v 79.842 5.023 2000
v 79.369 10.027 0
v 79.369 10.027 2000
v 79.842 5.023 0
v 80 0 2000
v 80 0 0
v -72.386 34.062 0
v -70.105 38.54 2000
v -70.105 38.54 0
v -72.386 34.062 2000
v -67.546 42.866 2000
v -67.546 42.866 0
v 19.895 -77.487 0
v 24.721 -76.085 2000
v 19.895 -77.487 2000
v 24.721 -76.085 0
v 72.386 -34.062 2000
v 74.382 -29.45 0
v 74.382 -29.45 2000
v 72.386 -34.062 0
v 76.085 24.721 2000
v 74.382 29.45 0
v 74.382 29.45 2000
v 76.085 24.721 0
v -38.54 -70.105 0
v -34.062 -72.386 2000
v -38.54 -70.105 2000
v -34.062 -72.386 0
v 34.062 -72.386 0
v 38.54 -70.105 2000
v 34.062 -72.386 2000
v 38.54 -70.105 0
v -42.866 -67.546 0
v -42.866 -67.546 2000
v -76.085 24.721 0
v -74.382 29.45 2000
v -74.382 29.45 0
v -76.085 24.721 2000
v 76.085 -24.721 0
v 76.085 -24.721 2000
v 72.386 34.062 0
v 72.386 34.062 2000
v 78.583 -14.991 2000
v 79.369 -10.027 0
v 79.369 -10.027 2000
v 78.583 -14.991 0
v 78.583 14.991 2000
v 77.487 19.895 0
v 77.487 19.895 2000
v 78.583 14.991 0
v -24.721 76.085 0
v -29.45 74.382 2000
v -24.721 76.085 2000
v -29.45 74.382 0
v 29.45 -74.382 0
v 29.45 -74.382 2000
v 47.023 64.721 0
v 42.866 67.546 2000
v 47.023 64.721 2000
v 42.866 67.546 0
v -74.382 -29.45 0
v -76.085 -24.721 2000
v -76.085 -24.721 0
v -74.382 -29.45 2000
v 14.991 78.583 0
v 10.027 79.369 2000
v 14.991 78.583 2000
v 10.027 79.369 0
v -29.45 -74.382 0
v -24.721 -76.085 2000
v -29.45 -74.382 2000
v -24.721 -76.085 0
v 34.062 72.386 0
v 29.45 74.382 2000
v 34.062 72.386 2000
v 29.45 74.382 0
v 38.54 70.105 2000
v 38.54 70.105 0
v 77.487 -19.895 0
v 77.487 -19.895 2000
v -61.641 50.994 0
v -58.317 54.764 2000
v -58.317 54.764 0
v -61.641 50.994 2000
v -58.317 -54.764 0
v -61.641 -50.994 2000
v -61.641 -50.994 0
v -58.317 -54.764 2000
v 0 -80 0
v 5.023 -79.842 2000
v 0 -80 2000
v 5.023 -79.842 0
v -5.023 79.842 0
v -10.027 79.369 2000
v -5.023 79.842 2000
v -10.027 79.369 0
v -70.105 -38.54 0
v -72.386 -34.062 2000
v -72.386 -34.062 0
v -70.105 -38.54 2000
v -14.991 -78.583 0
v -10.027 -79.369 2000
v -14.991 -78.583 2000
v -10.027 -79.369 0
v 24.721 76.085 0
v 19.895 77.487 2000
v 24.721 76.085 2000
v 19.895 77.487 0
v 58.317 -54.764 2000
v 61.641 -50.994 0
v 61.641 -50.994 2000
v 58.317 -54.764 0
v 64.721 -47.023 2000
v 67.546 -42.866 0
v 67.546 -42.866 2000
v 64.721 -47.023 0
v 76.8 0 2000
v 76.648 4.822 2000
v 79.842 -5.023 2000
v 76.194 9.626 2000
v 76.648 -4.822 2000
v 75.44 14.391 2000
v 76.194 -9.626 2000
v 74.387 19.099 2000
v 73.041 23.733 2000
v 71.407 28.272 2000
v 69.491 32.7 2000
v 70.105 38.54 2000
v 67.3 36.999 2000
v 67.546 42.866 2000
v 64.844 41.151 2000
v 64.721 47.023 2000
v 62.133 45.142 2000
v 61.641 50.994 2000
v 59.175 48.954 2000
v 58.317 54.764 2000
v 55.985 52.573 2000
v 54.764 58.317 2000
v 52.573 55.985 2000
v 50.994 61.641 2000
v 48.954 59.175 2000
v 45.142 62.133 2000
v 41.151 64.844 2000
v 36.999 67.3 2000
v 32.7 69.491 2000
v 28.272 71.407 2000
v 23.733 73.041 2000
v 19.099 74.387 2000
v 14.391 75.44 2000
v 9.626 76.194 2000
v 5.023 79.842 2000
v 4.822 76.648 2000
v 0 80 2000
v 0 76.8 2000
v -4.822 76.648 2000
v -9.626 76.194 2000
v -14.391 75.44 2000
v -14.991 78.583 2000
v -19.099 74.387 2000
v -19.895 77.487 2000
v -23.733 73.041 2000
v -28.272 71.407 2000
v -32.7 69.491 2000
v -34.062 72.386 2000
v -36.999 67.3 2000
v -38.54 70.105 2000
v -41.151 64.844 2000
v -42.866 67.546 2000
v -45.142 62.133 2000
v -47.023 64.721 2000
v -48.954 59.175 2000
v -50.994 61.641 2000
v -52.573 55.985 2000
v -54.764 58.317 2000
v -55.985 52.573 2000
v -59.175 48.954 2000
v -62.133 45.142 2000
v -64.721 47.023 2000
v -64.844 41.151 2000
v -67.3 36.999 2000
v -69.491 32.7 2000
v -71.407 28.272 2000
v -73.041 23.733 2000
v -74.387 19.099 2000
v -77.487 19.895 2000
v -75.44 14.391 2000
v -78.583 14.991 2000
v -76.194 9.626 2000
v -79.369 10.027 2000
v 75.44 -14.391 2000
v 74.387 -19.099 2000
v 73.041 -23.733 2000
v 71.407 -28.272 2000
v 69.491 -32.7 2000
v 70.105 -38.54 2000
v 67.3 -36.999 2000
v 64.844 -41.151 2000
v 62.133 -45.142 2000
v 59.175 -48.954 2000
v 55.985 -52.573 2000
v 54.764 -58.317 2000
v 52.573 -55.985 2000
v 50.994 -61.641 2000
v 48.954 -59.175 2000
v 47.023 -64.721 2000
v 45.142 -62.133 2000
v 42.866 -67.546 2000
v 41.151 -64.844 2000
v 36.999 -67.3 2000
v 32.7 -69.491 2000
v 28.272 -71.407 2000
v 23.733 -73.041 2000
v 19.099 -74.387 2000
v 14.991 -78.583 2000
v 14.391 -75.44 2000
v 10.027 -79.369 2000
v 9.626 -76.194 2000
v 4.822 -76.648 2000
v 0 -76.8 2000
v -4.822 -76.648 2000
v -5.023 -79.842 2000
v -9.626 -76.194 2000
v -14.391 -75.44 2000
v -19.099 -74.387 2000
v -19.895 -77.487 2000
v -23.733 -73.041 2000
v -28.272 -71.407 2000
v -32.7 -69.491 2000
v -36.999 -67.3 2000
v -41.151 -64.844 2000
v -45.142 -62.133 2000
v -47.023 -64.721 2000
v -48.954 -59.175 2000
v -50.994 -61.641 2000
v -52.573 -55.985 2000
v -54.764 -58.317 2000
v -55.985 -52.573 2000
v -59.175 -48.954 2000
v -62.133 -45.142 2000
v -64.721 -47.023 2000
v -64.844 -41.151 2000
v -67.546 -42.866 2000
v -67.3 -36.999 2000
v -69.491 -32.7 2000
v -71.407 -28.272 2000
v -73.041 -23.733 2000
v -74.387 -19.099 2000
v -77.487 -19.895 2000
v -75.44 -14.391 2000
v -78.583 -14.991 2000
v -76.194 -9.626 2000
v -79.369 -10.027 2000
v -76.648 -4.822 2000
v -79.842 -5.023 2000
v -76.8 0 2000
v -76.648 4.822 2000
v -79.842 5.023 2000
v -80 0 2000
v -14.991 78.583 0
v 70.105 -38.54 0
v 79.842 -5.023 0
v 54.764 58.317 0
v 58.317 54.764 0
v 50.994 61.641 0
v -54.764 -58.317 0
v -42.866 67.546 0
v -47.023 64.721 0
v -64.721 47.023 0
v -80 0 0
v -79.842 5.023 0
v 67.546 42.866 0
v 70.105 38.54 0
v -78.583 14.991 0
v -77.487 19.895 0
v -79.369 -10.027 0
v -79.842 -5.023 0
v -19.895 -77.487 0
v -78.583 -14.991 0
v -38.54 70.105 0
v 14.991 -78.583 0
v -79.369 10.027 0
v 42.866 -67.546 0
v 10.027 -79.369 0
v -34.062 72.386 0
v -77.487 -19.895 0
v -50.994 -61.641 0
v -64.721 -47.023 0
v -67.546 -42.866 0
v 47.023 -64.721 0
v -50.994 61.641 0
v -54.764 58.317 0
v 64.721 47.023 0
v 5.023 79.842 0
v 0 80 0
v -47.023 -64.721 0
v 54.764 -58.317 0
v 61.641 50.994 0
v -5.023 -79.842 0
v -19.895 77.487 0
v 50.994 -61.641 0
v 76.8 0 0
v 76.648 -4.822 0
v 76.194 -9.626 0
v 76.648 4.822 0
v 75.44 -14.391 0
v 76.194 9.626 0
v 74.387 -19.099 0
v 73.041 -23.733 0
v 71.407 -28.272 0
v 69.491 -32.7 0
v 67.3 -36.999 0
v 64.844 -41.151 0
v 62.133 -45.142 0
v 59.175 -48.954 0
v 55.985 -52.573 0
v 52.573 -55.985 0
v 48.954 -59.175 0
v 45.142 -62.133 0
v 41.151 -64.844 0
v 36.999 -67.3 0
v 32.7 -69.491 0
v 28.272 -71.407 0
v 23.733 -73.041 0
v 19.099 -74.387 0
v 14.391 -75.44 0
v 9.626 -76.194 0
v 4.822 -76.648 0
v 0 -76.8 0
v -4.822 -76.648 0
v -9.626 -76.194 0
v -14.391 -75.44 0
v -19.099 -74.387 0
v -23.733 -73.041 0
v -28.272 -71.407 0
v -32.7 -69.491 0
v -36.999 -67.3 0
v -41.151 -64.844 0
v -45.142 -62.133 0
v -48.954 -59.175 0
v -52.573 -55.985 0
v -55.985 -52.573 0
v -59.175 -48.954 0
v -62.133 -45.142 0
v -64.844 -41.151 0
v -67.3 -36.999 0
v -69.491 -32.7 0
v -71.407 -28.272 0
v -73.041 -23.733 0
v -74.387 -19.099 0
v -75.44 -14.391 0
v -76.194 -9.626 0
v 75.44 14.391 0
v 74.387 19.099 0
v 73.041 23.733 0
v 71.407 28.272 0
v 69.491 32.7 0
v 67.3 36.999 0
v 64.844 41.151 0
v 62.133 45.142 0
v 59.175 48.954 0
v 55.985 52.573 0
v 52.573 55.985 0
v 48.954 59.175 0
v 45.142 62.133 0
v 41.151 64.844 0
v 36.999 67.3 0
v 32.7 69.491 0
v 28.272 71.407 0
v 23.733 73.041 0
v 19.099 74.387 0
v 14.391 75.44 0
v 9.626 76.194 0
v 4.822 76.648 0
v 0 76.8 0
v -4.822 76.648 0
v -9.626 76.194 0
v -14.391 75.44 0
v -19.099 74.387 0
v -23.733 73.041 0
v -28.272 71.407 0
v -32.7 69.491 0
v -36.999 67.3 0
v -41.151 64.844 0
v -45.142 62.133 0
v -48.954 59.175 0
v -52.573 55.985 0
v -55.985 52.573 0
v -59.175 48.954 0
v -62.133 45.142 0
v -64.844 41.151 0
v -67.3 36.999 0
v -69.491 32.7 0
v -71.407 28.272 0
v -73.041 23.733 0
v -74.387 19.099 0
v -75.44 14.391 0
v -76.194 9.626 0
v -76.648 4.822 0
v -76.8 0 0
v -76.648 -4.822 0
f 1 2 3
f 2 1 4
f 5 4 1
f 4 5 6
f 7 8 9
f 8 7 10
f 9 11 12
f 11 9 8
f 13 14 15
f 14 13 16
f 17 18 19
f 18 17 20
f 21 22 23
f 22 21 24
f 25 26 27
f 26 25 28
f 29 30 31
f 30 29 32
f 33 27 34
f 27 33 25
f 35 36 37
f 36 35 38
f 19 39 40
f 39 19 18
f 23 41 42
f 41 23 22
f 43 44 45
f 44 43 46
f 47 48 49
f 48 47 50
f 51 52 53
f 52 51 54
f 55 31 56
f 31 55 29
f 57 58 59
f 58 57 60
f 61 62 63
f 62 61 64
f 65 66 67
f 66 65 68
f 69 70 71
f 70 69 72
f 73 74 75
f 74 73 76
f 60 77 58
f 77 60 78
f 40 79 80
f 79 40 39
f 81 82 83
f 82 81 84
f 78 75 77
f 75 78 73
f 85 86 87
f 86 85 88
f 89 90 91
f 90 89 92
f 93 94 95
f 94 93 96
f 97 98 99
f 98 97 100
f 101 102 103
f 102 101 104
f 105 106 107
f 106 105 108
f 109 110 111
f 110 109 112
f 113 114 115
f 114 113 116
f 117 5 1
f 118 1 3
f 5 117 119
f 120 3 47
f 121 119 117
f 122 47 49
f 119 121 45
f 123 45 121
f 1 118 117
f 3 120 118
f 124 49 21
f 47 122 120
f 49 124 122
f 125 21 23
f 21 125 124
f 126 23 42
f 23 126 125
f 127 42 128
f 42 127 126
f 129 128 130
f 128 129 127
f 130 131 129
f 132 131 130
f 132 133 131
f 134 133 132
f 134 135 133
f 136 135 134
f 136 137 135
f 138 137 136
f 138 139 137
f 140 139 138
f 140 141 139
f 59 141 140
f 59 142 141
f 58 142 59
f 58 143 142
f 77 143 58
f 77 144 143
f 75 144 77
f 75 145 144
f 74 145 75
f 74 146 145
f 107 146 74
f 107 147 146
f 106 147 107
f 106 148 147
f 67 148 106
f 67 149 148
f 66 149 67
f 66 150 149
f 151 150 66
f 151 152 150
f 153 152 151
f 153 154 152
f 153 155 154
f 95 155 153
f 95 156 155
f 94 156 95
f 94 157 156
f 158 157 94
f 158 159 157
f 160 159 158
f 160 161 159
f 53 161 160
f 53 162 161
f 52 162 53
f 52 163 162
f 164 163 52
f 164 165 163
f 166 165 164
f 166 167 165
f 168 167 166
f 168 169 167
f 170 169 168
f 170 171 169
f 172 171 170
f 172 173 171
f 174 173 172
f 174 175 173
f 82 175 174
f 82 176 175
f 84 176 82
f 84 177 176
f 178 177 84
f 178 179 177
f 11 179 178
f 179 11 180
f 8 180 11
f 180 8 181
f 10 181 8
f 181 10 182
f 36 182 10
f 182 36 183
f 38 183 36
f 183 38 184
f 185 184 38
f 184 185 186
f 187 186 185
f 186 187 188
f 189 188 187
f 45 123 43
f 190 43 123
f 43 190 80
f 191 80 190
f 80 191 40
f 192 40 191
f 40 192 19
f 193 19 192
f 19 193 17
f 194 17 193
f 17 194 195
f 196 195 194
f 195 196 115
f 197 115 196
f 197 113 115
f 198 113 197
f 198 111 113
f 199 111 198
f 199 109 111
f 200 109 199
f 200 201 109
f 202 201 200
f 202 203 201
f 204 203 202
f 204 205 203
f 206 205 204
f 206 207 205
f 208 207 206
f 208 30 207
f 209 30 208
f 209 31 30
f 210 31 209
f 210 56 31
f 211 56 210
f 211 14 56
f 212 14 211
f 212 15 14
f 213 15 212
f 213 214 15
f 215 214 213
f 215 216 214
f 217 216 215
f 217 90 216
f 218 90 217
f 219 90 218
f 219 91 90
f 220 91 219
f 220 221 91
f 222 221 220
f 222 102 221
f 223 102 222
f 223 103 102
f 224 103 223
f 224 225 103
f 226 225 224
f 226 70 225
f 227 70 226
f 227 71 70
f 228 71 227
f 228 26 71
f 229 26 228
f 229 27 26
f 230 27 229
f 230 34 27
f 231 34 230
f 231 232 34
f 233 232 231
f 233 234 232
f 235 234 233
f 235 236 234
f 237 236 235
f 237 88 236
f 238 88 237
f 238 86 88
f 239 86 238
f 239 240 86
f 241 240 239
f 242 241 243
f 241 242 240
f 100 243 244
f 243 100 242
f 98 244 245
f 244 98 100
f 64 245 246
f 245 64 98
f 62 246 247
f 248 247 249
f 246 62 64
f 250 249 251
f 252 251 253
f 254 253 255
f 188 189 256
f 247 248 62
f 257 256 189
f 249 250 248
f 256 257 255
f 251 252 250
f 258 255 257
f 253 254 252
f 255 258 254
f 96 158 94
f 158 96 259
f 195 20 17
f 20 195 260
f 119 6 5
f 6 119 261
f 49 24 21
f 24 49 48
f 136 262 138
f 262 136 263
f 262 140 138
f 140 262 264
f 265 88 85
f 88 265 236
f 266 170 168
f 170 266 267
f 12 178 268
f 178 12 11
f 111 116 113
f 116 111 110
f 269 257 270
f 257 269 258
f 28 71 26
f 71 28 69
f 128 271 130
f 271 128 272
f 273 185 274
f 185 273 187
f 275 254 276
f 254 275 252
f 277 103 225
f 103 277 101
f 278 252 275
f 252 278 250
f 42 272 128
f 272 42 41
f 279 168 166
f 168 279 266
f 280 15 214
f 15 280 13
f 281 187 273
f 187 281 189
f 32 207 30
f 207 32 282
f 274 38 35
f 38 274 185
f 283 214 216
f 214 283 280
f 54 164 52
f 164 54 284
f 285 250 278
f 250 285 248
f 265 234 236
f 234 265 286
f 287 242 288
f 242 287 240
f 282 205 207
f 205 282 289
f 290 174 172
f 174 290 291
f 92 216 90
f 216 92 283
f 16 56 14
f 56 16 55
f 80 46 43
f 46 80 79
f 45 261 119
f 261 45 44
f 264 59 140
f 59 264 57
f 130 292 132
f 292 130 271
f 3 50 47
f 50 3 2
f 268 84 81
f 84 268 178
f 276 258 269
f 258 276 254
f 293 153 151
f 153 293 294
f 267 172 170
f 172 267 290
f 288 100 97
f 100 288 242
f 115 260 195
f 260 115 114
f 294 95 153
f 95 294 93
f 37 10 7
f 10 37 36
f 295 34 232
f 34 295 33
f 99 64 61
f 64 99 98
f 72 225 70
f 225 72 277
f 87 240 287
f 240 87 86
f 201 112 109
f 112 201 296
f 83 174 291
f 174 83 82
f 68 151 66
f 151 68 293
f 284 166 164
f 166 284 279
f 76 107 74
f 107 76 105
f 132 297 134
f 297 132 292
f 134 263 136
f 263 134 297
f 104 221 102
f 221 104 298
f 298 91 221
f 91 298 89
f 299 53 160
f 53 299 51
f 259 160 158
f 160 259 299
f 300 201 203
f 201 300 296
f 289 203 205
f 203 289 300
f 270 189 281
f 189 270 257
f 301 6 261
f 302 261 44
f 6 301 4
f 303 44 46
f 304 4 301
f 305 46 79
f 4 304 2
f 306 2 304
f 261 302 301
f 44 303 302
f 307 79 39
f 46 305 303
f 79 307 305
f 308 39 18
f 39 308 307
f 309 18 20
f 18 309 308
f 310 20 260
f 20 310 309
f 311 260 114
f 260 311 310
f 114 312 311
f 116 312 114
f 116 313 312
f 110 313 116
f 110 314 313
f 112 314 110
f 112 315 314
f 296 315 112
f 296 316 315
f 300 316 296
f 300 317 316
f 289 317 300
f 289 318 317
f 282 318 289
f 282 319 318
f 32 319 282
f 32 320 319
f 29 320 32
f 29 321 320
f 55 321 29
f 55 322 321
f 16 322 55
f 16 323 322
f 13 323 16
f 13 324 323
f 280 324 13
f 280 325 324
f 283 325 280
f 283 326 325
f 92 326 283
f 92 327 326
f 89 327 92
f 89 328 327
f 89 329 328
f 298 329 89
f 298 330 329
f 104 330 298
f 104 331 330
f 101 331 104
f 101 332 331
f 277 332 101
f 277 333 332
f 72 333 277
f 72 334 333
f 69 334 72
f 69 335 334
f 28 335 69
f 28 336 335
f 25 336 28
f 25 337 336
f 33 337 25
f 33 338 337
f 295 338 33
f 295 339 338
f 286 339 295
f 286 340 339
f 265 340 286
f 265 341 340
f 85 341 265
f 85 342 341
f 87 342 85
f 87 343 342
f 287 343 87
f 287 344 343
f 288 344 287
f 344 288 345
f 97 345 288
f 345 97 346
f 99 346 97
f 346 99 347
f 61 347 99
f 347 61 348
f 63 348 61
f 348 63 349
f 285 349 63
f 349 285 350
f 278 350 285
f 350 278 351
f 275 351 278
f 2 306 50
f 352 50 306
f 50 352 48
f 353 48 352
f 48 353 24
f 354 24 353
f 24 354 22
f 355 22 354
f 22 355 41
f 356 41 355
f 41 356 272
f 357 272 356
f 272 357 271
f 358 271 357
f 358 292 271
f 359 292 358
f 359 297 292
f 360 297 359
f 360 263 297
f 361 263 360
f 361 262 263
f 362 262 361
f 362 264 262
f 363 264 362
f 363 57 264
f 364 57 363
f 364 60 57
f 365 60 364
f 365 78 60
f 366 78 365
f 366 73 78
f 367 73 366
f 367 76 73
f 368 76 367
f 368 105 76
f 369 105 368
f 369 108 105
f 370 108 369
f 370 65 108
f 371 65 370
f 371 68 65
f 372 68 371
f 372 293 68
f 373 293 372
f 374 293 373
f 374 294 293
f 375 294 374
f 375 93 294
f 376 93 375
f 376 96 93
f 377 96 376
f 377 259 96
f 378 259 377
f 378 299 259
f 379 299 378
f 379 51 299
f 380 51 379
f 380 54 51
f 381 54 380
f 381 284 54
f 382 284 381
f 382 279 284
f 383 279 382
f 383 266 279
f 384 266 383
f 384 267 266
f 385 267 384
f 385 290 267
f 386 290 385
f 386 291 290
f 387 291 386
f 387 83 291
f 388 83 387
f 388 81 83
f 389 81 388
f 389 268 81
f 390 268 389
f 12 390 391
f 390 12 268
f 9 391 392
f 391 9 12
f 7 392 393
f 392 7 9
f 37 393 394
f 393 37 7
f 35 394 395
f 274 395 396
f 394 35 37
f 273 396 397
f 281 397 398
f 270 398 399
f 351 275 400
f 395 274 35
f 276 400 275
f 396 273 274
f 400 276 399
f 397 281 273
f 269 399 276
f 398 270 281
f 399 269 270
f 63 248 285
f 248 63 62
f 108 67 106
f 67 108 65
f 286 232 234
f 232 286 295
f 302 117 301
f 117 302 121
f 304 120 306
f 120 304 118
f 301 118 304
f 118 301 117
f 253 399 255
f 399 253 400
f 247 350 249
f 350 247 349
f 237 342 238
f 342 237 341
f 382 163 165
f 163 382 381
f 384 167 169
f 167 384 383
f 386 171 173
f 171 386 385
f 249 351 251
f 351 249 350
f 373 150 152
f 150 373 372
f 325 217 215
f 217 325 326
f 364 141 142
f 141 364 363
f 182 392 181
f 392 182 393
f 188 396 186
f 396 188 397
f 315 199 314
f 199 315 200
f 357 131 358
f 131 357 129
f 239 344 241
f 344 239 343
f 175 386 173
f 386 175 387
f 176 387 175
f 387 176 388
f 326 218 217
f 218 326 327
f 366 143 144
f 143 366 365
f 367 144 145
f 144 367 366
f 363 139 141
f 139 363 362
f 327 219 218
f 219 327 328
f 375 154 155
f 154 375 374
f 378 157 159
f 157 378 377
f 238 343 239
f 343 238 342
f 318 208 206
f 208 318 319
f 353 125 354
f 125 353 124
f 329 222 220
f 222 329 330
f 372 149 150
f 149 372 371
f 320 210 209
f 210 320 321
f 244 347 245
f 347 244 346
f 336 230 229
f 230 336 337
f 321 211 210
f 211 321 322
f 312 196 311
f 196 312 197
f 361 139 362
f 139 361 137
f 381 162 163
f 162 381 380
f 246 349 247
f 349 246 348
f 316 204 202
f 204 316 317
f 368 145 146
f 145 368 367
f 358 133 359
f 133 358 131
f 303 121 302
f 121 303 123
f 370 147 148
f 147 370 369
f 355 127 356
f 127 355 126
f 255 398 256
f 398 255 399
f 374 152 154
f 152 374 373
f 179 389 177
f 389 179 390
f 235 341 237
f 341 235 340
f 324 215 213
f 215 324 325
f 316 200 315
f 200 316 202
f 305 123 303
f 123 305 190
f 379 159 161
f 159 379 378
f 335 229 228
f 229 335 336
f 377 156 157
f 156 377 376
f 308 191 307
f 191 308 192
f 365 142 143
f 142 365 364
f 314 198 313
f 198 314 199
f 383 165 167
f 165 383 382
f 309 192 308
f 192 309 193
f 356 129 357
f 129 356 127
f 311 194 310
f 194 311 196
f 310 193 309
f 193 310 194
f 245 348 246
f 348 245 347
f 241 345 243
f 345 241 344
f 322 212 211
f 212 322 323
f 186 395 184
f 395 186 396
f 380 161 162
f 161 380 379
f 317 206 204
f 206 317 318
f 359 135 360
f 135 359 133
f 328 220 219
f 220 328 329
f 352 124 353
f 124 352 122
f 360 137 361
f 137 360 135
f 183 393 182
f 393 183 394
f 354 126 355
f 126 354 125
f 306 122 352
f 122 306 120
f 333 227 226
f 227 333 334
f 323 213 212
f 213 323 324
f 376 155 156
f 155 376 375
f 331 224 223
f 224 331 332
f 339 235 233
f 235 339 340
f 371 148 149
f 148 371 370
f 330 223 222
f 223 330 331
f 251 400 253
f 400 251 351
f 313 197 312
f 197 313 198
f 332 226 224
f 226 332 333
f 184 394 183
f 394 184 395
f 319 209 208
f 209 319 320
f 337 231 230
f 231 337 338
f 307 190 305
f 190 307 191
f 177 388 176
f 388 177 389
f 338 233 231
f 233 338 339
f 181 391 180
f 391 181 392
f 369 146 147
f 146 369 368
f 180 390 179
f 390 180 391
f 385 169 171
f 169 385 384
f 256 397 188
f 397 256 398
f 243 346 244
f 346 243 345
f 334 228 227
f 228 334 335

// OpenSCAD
// HT 160 PVC Pipe Segment with a length of 2000 mm

// Parameters
pipe_diameter = 160; // Outer diameter in mm
pipe_thickness = 3.2; // Wall thickness in mm
pipe_length = 2000; // Length of the pipe in mm
fitting_length = 50; // Length of the integrated end fitting in mm

// Function to create the main pipe body
module ht_pipe_body() {
    difference() {
        cylinder(h = pipe_length, d = pipe_diameter, $fn=100);
        translate([0, 0, -1])
            cylinder(h = pipe_length + 2, d = pipe_diameter - 2 * pipe_thickness, $fn=100);
    }
}

// Function to create the integrated end fitting
module integrated_end_fitting() {
    translate([0, 0, pipe_length - fitting_length])
        difference() {
            cylinder(h = fitting_length, d = pipe_diameter, $fn=100);
            translate([0, 0, -1])
                cylinder(h = fitting_length + 2, d = pipe_diameter - 2 * pipe_thickness, $fn=100);
        }
}

// Main module to create the HT pipe
module ht_pipe() {
    ht_pipe_body();
    integrated_end_fitting();
}

// Render the HT pipe
ht_pipe();
